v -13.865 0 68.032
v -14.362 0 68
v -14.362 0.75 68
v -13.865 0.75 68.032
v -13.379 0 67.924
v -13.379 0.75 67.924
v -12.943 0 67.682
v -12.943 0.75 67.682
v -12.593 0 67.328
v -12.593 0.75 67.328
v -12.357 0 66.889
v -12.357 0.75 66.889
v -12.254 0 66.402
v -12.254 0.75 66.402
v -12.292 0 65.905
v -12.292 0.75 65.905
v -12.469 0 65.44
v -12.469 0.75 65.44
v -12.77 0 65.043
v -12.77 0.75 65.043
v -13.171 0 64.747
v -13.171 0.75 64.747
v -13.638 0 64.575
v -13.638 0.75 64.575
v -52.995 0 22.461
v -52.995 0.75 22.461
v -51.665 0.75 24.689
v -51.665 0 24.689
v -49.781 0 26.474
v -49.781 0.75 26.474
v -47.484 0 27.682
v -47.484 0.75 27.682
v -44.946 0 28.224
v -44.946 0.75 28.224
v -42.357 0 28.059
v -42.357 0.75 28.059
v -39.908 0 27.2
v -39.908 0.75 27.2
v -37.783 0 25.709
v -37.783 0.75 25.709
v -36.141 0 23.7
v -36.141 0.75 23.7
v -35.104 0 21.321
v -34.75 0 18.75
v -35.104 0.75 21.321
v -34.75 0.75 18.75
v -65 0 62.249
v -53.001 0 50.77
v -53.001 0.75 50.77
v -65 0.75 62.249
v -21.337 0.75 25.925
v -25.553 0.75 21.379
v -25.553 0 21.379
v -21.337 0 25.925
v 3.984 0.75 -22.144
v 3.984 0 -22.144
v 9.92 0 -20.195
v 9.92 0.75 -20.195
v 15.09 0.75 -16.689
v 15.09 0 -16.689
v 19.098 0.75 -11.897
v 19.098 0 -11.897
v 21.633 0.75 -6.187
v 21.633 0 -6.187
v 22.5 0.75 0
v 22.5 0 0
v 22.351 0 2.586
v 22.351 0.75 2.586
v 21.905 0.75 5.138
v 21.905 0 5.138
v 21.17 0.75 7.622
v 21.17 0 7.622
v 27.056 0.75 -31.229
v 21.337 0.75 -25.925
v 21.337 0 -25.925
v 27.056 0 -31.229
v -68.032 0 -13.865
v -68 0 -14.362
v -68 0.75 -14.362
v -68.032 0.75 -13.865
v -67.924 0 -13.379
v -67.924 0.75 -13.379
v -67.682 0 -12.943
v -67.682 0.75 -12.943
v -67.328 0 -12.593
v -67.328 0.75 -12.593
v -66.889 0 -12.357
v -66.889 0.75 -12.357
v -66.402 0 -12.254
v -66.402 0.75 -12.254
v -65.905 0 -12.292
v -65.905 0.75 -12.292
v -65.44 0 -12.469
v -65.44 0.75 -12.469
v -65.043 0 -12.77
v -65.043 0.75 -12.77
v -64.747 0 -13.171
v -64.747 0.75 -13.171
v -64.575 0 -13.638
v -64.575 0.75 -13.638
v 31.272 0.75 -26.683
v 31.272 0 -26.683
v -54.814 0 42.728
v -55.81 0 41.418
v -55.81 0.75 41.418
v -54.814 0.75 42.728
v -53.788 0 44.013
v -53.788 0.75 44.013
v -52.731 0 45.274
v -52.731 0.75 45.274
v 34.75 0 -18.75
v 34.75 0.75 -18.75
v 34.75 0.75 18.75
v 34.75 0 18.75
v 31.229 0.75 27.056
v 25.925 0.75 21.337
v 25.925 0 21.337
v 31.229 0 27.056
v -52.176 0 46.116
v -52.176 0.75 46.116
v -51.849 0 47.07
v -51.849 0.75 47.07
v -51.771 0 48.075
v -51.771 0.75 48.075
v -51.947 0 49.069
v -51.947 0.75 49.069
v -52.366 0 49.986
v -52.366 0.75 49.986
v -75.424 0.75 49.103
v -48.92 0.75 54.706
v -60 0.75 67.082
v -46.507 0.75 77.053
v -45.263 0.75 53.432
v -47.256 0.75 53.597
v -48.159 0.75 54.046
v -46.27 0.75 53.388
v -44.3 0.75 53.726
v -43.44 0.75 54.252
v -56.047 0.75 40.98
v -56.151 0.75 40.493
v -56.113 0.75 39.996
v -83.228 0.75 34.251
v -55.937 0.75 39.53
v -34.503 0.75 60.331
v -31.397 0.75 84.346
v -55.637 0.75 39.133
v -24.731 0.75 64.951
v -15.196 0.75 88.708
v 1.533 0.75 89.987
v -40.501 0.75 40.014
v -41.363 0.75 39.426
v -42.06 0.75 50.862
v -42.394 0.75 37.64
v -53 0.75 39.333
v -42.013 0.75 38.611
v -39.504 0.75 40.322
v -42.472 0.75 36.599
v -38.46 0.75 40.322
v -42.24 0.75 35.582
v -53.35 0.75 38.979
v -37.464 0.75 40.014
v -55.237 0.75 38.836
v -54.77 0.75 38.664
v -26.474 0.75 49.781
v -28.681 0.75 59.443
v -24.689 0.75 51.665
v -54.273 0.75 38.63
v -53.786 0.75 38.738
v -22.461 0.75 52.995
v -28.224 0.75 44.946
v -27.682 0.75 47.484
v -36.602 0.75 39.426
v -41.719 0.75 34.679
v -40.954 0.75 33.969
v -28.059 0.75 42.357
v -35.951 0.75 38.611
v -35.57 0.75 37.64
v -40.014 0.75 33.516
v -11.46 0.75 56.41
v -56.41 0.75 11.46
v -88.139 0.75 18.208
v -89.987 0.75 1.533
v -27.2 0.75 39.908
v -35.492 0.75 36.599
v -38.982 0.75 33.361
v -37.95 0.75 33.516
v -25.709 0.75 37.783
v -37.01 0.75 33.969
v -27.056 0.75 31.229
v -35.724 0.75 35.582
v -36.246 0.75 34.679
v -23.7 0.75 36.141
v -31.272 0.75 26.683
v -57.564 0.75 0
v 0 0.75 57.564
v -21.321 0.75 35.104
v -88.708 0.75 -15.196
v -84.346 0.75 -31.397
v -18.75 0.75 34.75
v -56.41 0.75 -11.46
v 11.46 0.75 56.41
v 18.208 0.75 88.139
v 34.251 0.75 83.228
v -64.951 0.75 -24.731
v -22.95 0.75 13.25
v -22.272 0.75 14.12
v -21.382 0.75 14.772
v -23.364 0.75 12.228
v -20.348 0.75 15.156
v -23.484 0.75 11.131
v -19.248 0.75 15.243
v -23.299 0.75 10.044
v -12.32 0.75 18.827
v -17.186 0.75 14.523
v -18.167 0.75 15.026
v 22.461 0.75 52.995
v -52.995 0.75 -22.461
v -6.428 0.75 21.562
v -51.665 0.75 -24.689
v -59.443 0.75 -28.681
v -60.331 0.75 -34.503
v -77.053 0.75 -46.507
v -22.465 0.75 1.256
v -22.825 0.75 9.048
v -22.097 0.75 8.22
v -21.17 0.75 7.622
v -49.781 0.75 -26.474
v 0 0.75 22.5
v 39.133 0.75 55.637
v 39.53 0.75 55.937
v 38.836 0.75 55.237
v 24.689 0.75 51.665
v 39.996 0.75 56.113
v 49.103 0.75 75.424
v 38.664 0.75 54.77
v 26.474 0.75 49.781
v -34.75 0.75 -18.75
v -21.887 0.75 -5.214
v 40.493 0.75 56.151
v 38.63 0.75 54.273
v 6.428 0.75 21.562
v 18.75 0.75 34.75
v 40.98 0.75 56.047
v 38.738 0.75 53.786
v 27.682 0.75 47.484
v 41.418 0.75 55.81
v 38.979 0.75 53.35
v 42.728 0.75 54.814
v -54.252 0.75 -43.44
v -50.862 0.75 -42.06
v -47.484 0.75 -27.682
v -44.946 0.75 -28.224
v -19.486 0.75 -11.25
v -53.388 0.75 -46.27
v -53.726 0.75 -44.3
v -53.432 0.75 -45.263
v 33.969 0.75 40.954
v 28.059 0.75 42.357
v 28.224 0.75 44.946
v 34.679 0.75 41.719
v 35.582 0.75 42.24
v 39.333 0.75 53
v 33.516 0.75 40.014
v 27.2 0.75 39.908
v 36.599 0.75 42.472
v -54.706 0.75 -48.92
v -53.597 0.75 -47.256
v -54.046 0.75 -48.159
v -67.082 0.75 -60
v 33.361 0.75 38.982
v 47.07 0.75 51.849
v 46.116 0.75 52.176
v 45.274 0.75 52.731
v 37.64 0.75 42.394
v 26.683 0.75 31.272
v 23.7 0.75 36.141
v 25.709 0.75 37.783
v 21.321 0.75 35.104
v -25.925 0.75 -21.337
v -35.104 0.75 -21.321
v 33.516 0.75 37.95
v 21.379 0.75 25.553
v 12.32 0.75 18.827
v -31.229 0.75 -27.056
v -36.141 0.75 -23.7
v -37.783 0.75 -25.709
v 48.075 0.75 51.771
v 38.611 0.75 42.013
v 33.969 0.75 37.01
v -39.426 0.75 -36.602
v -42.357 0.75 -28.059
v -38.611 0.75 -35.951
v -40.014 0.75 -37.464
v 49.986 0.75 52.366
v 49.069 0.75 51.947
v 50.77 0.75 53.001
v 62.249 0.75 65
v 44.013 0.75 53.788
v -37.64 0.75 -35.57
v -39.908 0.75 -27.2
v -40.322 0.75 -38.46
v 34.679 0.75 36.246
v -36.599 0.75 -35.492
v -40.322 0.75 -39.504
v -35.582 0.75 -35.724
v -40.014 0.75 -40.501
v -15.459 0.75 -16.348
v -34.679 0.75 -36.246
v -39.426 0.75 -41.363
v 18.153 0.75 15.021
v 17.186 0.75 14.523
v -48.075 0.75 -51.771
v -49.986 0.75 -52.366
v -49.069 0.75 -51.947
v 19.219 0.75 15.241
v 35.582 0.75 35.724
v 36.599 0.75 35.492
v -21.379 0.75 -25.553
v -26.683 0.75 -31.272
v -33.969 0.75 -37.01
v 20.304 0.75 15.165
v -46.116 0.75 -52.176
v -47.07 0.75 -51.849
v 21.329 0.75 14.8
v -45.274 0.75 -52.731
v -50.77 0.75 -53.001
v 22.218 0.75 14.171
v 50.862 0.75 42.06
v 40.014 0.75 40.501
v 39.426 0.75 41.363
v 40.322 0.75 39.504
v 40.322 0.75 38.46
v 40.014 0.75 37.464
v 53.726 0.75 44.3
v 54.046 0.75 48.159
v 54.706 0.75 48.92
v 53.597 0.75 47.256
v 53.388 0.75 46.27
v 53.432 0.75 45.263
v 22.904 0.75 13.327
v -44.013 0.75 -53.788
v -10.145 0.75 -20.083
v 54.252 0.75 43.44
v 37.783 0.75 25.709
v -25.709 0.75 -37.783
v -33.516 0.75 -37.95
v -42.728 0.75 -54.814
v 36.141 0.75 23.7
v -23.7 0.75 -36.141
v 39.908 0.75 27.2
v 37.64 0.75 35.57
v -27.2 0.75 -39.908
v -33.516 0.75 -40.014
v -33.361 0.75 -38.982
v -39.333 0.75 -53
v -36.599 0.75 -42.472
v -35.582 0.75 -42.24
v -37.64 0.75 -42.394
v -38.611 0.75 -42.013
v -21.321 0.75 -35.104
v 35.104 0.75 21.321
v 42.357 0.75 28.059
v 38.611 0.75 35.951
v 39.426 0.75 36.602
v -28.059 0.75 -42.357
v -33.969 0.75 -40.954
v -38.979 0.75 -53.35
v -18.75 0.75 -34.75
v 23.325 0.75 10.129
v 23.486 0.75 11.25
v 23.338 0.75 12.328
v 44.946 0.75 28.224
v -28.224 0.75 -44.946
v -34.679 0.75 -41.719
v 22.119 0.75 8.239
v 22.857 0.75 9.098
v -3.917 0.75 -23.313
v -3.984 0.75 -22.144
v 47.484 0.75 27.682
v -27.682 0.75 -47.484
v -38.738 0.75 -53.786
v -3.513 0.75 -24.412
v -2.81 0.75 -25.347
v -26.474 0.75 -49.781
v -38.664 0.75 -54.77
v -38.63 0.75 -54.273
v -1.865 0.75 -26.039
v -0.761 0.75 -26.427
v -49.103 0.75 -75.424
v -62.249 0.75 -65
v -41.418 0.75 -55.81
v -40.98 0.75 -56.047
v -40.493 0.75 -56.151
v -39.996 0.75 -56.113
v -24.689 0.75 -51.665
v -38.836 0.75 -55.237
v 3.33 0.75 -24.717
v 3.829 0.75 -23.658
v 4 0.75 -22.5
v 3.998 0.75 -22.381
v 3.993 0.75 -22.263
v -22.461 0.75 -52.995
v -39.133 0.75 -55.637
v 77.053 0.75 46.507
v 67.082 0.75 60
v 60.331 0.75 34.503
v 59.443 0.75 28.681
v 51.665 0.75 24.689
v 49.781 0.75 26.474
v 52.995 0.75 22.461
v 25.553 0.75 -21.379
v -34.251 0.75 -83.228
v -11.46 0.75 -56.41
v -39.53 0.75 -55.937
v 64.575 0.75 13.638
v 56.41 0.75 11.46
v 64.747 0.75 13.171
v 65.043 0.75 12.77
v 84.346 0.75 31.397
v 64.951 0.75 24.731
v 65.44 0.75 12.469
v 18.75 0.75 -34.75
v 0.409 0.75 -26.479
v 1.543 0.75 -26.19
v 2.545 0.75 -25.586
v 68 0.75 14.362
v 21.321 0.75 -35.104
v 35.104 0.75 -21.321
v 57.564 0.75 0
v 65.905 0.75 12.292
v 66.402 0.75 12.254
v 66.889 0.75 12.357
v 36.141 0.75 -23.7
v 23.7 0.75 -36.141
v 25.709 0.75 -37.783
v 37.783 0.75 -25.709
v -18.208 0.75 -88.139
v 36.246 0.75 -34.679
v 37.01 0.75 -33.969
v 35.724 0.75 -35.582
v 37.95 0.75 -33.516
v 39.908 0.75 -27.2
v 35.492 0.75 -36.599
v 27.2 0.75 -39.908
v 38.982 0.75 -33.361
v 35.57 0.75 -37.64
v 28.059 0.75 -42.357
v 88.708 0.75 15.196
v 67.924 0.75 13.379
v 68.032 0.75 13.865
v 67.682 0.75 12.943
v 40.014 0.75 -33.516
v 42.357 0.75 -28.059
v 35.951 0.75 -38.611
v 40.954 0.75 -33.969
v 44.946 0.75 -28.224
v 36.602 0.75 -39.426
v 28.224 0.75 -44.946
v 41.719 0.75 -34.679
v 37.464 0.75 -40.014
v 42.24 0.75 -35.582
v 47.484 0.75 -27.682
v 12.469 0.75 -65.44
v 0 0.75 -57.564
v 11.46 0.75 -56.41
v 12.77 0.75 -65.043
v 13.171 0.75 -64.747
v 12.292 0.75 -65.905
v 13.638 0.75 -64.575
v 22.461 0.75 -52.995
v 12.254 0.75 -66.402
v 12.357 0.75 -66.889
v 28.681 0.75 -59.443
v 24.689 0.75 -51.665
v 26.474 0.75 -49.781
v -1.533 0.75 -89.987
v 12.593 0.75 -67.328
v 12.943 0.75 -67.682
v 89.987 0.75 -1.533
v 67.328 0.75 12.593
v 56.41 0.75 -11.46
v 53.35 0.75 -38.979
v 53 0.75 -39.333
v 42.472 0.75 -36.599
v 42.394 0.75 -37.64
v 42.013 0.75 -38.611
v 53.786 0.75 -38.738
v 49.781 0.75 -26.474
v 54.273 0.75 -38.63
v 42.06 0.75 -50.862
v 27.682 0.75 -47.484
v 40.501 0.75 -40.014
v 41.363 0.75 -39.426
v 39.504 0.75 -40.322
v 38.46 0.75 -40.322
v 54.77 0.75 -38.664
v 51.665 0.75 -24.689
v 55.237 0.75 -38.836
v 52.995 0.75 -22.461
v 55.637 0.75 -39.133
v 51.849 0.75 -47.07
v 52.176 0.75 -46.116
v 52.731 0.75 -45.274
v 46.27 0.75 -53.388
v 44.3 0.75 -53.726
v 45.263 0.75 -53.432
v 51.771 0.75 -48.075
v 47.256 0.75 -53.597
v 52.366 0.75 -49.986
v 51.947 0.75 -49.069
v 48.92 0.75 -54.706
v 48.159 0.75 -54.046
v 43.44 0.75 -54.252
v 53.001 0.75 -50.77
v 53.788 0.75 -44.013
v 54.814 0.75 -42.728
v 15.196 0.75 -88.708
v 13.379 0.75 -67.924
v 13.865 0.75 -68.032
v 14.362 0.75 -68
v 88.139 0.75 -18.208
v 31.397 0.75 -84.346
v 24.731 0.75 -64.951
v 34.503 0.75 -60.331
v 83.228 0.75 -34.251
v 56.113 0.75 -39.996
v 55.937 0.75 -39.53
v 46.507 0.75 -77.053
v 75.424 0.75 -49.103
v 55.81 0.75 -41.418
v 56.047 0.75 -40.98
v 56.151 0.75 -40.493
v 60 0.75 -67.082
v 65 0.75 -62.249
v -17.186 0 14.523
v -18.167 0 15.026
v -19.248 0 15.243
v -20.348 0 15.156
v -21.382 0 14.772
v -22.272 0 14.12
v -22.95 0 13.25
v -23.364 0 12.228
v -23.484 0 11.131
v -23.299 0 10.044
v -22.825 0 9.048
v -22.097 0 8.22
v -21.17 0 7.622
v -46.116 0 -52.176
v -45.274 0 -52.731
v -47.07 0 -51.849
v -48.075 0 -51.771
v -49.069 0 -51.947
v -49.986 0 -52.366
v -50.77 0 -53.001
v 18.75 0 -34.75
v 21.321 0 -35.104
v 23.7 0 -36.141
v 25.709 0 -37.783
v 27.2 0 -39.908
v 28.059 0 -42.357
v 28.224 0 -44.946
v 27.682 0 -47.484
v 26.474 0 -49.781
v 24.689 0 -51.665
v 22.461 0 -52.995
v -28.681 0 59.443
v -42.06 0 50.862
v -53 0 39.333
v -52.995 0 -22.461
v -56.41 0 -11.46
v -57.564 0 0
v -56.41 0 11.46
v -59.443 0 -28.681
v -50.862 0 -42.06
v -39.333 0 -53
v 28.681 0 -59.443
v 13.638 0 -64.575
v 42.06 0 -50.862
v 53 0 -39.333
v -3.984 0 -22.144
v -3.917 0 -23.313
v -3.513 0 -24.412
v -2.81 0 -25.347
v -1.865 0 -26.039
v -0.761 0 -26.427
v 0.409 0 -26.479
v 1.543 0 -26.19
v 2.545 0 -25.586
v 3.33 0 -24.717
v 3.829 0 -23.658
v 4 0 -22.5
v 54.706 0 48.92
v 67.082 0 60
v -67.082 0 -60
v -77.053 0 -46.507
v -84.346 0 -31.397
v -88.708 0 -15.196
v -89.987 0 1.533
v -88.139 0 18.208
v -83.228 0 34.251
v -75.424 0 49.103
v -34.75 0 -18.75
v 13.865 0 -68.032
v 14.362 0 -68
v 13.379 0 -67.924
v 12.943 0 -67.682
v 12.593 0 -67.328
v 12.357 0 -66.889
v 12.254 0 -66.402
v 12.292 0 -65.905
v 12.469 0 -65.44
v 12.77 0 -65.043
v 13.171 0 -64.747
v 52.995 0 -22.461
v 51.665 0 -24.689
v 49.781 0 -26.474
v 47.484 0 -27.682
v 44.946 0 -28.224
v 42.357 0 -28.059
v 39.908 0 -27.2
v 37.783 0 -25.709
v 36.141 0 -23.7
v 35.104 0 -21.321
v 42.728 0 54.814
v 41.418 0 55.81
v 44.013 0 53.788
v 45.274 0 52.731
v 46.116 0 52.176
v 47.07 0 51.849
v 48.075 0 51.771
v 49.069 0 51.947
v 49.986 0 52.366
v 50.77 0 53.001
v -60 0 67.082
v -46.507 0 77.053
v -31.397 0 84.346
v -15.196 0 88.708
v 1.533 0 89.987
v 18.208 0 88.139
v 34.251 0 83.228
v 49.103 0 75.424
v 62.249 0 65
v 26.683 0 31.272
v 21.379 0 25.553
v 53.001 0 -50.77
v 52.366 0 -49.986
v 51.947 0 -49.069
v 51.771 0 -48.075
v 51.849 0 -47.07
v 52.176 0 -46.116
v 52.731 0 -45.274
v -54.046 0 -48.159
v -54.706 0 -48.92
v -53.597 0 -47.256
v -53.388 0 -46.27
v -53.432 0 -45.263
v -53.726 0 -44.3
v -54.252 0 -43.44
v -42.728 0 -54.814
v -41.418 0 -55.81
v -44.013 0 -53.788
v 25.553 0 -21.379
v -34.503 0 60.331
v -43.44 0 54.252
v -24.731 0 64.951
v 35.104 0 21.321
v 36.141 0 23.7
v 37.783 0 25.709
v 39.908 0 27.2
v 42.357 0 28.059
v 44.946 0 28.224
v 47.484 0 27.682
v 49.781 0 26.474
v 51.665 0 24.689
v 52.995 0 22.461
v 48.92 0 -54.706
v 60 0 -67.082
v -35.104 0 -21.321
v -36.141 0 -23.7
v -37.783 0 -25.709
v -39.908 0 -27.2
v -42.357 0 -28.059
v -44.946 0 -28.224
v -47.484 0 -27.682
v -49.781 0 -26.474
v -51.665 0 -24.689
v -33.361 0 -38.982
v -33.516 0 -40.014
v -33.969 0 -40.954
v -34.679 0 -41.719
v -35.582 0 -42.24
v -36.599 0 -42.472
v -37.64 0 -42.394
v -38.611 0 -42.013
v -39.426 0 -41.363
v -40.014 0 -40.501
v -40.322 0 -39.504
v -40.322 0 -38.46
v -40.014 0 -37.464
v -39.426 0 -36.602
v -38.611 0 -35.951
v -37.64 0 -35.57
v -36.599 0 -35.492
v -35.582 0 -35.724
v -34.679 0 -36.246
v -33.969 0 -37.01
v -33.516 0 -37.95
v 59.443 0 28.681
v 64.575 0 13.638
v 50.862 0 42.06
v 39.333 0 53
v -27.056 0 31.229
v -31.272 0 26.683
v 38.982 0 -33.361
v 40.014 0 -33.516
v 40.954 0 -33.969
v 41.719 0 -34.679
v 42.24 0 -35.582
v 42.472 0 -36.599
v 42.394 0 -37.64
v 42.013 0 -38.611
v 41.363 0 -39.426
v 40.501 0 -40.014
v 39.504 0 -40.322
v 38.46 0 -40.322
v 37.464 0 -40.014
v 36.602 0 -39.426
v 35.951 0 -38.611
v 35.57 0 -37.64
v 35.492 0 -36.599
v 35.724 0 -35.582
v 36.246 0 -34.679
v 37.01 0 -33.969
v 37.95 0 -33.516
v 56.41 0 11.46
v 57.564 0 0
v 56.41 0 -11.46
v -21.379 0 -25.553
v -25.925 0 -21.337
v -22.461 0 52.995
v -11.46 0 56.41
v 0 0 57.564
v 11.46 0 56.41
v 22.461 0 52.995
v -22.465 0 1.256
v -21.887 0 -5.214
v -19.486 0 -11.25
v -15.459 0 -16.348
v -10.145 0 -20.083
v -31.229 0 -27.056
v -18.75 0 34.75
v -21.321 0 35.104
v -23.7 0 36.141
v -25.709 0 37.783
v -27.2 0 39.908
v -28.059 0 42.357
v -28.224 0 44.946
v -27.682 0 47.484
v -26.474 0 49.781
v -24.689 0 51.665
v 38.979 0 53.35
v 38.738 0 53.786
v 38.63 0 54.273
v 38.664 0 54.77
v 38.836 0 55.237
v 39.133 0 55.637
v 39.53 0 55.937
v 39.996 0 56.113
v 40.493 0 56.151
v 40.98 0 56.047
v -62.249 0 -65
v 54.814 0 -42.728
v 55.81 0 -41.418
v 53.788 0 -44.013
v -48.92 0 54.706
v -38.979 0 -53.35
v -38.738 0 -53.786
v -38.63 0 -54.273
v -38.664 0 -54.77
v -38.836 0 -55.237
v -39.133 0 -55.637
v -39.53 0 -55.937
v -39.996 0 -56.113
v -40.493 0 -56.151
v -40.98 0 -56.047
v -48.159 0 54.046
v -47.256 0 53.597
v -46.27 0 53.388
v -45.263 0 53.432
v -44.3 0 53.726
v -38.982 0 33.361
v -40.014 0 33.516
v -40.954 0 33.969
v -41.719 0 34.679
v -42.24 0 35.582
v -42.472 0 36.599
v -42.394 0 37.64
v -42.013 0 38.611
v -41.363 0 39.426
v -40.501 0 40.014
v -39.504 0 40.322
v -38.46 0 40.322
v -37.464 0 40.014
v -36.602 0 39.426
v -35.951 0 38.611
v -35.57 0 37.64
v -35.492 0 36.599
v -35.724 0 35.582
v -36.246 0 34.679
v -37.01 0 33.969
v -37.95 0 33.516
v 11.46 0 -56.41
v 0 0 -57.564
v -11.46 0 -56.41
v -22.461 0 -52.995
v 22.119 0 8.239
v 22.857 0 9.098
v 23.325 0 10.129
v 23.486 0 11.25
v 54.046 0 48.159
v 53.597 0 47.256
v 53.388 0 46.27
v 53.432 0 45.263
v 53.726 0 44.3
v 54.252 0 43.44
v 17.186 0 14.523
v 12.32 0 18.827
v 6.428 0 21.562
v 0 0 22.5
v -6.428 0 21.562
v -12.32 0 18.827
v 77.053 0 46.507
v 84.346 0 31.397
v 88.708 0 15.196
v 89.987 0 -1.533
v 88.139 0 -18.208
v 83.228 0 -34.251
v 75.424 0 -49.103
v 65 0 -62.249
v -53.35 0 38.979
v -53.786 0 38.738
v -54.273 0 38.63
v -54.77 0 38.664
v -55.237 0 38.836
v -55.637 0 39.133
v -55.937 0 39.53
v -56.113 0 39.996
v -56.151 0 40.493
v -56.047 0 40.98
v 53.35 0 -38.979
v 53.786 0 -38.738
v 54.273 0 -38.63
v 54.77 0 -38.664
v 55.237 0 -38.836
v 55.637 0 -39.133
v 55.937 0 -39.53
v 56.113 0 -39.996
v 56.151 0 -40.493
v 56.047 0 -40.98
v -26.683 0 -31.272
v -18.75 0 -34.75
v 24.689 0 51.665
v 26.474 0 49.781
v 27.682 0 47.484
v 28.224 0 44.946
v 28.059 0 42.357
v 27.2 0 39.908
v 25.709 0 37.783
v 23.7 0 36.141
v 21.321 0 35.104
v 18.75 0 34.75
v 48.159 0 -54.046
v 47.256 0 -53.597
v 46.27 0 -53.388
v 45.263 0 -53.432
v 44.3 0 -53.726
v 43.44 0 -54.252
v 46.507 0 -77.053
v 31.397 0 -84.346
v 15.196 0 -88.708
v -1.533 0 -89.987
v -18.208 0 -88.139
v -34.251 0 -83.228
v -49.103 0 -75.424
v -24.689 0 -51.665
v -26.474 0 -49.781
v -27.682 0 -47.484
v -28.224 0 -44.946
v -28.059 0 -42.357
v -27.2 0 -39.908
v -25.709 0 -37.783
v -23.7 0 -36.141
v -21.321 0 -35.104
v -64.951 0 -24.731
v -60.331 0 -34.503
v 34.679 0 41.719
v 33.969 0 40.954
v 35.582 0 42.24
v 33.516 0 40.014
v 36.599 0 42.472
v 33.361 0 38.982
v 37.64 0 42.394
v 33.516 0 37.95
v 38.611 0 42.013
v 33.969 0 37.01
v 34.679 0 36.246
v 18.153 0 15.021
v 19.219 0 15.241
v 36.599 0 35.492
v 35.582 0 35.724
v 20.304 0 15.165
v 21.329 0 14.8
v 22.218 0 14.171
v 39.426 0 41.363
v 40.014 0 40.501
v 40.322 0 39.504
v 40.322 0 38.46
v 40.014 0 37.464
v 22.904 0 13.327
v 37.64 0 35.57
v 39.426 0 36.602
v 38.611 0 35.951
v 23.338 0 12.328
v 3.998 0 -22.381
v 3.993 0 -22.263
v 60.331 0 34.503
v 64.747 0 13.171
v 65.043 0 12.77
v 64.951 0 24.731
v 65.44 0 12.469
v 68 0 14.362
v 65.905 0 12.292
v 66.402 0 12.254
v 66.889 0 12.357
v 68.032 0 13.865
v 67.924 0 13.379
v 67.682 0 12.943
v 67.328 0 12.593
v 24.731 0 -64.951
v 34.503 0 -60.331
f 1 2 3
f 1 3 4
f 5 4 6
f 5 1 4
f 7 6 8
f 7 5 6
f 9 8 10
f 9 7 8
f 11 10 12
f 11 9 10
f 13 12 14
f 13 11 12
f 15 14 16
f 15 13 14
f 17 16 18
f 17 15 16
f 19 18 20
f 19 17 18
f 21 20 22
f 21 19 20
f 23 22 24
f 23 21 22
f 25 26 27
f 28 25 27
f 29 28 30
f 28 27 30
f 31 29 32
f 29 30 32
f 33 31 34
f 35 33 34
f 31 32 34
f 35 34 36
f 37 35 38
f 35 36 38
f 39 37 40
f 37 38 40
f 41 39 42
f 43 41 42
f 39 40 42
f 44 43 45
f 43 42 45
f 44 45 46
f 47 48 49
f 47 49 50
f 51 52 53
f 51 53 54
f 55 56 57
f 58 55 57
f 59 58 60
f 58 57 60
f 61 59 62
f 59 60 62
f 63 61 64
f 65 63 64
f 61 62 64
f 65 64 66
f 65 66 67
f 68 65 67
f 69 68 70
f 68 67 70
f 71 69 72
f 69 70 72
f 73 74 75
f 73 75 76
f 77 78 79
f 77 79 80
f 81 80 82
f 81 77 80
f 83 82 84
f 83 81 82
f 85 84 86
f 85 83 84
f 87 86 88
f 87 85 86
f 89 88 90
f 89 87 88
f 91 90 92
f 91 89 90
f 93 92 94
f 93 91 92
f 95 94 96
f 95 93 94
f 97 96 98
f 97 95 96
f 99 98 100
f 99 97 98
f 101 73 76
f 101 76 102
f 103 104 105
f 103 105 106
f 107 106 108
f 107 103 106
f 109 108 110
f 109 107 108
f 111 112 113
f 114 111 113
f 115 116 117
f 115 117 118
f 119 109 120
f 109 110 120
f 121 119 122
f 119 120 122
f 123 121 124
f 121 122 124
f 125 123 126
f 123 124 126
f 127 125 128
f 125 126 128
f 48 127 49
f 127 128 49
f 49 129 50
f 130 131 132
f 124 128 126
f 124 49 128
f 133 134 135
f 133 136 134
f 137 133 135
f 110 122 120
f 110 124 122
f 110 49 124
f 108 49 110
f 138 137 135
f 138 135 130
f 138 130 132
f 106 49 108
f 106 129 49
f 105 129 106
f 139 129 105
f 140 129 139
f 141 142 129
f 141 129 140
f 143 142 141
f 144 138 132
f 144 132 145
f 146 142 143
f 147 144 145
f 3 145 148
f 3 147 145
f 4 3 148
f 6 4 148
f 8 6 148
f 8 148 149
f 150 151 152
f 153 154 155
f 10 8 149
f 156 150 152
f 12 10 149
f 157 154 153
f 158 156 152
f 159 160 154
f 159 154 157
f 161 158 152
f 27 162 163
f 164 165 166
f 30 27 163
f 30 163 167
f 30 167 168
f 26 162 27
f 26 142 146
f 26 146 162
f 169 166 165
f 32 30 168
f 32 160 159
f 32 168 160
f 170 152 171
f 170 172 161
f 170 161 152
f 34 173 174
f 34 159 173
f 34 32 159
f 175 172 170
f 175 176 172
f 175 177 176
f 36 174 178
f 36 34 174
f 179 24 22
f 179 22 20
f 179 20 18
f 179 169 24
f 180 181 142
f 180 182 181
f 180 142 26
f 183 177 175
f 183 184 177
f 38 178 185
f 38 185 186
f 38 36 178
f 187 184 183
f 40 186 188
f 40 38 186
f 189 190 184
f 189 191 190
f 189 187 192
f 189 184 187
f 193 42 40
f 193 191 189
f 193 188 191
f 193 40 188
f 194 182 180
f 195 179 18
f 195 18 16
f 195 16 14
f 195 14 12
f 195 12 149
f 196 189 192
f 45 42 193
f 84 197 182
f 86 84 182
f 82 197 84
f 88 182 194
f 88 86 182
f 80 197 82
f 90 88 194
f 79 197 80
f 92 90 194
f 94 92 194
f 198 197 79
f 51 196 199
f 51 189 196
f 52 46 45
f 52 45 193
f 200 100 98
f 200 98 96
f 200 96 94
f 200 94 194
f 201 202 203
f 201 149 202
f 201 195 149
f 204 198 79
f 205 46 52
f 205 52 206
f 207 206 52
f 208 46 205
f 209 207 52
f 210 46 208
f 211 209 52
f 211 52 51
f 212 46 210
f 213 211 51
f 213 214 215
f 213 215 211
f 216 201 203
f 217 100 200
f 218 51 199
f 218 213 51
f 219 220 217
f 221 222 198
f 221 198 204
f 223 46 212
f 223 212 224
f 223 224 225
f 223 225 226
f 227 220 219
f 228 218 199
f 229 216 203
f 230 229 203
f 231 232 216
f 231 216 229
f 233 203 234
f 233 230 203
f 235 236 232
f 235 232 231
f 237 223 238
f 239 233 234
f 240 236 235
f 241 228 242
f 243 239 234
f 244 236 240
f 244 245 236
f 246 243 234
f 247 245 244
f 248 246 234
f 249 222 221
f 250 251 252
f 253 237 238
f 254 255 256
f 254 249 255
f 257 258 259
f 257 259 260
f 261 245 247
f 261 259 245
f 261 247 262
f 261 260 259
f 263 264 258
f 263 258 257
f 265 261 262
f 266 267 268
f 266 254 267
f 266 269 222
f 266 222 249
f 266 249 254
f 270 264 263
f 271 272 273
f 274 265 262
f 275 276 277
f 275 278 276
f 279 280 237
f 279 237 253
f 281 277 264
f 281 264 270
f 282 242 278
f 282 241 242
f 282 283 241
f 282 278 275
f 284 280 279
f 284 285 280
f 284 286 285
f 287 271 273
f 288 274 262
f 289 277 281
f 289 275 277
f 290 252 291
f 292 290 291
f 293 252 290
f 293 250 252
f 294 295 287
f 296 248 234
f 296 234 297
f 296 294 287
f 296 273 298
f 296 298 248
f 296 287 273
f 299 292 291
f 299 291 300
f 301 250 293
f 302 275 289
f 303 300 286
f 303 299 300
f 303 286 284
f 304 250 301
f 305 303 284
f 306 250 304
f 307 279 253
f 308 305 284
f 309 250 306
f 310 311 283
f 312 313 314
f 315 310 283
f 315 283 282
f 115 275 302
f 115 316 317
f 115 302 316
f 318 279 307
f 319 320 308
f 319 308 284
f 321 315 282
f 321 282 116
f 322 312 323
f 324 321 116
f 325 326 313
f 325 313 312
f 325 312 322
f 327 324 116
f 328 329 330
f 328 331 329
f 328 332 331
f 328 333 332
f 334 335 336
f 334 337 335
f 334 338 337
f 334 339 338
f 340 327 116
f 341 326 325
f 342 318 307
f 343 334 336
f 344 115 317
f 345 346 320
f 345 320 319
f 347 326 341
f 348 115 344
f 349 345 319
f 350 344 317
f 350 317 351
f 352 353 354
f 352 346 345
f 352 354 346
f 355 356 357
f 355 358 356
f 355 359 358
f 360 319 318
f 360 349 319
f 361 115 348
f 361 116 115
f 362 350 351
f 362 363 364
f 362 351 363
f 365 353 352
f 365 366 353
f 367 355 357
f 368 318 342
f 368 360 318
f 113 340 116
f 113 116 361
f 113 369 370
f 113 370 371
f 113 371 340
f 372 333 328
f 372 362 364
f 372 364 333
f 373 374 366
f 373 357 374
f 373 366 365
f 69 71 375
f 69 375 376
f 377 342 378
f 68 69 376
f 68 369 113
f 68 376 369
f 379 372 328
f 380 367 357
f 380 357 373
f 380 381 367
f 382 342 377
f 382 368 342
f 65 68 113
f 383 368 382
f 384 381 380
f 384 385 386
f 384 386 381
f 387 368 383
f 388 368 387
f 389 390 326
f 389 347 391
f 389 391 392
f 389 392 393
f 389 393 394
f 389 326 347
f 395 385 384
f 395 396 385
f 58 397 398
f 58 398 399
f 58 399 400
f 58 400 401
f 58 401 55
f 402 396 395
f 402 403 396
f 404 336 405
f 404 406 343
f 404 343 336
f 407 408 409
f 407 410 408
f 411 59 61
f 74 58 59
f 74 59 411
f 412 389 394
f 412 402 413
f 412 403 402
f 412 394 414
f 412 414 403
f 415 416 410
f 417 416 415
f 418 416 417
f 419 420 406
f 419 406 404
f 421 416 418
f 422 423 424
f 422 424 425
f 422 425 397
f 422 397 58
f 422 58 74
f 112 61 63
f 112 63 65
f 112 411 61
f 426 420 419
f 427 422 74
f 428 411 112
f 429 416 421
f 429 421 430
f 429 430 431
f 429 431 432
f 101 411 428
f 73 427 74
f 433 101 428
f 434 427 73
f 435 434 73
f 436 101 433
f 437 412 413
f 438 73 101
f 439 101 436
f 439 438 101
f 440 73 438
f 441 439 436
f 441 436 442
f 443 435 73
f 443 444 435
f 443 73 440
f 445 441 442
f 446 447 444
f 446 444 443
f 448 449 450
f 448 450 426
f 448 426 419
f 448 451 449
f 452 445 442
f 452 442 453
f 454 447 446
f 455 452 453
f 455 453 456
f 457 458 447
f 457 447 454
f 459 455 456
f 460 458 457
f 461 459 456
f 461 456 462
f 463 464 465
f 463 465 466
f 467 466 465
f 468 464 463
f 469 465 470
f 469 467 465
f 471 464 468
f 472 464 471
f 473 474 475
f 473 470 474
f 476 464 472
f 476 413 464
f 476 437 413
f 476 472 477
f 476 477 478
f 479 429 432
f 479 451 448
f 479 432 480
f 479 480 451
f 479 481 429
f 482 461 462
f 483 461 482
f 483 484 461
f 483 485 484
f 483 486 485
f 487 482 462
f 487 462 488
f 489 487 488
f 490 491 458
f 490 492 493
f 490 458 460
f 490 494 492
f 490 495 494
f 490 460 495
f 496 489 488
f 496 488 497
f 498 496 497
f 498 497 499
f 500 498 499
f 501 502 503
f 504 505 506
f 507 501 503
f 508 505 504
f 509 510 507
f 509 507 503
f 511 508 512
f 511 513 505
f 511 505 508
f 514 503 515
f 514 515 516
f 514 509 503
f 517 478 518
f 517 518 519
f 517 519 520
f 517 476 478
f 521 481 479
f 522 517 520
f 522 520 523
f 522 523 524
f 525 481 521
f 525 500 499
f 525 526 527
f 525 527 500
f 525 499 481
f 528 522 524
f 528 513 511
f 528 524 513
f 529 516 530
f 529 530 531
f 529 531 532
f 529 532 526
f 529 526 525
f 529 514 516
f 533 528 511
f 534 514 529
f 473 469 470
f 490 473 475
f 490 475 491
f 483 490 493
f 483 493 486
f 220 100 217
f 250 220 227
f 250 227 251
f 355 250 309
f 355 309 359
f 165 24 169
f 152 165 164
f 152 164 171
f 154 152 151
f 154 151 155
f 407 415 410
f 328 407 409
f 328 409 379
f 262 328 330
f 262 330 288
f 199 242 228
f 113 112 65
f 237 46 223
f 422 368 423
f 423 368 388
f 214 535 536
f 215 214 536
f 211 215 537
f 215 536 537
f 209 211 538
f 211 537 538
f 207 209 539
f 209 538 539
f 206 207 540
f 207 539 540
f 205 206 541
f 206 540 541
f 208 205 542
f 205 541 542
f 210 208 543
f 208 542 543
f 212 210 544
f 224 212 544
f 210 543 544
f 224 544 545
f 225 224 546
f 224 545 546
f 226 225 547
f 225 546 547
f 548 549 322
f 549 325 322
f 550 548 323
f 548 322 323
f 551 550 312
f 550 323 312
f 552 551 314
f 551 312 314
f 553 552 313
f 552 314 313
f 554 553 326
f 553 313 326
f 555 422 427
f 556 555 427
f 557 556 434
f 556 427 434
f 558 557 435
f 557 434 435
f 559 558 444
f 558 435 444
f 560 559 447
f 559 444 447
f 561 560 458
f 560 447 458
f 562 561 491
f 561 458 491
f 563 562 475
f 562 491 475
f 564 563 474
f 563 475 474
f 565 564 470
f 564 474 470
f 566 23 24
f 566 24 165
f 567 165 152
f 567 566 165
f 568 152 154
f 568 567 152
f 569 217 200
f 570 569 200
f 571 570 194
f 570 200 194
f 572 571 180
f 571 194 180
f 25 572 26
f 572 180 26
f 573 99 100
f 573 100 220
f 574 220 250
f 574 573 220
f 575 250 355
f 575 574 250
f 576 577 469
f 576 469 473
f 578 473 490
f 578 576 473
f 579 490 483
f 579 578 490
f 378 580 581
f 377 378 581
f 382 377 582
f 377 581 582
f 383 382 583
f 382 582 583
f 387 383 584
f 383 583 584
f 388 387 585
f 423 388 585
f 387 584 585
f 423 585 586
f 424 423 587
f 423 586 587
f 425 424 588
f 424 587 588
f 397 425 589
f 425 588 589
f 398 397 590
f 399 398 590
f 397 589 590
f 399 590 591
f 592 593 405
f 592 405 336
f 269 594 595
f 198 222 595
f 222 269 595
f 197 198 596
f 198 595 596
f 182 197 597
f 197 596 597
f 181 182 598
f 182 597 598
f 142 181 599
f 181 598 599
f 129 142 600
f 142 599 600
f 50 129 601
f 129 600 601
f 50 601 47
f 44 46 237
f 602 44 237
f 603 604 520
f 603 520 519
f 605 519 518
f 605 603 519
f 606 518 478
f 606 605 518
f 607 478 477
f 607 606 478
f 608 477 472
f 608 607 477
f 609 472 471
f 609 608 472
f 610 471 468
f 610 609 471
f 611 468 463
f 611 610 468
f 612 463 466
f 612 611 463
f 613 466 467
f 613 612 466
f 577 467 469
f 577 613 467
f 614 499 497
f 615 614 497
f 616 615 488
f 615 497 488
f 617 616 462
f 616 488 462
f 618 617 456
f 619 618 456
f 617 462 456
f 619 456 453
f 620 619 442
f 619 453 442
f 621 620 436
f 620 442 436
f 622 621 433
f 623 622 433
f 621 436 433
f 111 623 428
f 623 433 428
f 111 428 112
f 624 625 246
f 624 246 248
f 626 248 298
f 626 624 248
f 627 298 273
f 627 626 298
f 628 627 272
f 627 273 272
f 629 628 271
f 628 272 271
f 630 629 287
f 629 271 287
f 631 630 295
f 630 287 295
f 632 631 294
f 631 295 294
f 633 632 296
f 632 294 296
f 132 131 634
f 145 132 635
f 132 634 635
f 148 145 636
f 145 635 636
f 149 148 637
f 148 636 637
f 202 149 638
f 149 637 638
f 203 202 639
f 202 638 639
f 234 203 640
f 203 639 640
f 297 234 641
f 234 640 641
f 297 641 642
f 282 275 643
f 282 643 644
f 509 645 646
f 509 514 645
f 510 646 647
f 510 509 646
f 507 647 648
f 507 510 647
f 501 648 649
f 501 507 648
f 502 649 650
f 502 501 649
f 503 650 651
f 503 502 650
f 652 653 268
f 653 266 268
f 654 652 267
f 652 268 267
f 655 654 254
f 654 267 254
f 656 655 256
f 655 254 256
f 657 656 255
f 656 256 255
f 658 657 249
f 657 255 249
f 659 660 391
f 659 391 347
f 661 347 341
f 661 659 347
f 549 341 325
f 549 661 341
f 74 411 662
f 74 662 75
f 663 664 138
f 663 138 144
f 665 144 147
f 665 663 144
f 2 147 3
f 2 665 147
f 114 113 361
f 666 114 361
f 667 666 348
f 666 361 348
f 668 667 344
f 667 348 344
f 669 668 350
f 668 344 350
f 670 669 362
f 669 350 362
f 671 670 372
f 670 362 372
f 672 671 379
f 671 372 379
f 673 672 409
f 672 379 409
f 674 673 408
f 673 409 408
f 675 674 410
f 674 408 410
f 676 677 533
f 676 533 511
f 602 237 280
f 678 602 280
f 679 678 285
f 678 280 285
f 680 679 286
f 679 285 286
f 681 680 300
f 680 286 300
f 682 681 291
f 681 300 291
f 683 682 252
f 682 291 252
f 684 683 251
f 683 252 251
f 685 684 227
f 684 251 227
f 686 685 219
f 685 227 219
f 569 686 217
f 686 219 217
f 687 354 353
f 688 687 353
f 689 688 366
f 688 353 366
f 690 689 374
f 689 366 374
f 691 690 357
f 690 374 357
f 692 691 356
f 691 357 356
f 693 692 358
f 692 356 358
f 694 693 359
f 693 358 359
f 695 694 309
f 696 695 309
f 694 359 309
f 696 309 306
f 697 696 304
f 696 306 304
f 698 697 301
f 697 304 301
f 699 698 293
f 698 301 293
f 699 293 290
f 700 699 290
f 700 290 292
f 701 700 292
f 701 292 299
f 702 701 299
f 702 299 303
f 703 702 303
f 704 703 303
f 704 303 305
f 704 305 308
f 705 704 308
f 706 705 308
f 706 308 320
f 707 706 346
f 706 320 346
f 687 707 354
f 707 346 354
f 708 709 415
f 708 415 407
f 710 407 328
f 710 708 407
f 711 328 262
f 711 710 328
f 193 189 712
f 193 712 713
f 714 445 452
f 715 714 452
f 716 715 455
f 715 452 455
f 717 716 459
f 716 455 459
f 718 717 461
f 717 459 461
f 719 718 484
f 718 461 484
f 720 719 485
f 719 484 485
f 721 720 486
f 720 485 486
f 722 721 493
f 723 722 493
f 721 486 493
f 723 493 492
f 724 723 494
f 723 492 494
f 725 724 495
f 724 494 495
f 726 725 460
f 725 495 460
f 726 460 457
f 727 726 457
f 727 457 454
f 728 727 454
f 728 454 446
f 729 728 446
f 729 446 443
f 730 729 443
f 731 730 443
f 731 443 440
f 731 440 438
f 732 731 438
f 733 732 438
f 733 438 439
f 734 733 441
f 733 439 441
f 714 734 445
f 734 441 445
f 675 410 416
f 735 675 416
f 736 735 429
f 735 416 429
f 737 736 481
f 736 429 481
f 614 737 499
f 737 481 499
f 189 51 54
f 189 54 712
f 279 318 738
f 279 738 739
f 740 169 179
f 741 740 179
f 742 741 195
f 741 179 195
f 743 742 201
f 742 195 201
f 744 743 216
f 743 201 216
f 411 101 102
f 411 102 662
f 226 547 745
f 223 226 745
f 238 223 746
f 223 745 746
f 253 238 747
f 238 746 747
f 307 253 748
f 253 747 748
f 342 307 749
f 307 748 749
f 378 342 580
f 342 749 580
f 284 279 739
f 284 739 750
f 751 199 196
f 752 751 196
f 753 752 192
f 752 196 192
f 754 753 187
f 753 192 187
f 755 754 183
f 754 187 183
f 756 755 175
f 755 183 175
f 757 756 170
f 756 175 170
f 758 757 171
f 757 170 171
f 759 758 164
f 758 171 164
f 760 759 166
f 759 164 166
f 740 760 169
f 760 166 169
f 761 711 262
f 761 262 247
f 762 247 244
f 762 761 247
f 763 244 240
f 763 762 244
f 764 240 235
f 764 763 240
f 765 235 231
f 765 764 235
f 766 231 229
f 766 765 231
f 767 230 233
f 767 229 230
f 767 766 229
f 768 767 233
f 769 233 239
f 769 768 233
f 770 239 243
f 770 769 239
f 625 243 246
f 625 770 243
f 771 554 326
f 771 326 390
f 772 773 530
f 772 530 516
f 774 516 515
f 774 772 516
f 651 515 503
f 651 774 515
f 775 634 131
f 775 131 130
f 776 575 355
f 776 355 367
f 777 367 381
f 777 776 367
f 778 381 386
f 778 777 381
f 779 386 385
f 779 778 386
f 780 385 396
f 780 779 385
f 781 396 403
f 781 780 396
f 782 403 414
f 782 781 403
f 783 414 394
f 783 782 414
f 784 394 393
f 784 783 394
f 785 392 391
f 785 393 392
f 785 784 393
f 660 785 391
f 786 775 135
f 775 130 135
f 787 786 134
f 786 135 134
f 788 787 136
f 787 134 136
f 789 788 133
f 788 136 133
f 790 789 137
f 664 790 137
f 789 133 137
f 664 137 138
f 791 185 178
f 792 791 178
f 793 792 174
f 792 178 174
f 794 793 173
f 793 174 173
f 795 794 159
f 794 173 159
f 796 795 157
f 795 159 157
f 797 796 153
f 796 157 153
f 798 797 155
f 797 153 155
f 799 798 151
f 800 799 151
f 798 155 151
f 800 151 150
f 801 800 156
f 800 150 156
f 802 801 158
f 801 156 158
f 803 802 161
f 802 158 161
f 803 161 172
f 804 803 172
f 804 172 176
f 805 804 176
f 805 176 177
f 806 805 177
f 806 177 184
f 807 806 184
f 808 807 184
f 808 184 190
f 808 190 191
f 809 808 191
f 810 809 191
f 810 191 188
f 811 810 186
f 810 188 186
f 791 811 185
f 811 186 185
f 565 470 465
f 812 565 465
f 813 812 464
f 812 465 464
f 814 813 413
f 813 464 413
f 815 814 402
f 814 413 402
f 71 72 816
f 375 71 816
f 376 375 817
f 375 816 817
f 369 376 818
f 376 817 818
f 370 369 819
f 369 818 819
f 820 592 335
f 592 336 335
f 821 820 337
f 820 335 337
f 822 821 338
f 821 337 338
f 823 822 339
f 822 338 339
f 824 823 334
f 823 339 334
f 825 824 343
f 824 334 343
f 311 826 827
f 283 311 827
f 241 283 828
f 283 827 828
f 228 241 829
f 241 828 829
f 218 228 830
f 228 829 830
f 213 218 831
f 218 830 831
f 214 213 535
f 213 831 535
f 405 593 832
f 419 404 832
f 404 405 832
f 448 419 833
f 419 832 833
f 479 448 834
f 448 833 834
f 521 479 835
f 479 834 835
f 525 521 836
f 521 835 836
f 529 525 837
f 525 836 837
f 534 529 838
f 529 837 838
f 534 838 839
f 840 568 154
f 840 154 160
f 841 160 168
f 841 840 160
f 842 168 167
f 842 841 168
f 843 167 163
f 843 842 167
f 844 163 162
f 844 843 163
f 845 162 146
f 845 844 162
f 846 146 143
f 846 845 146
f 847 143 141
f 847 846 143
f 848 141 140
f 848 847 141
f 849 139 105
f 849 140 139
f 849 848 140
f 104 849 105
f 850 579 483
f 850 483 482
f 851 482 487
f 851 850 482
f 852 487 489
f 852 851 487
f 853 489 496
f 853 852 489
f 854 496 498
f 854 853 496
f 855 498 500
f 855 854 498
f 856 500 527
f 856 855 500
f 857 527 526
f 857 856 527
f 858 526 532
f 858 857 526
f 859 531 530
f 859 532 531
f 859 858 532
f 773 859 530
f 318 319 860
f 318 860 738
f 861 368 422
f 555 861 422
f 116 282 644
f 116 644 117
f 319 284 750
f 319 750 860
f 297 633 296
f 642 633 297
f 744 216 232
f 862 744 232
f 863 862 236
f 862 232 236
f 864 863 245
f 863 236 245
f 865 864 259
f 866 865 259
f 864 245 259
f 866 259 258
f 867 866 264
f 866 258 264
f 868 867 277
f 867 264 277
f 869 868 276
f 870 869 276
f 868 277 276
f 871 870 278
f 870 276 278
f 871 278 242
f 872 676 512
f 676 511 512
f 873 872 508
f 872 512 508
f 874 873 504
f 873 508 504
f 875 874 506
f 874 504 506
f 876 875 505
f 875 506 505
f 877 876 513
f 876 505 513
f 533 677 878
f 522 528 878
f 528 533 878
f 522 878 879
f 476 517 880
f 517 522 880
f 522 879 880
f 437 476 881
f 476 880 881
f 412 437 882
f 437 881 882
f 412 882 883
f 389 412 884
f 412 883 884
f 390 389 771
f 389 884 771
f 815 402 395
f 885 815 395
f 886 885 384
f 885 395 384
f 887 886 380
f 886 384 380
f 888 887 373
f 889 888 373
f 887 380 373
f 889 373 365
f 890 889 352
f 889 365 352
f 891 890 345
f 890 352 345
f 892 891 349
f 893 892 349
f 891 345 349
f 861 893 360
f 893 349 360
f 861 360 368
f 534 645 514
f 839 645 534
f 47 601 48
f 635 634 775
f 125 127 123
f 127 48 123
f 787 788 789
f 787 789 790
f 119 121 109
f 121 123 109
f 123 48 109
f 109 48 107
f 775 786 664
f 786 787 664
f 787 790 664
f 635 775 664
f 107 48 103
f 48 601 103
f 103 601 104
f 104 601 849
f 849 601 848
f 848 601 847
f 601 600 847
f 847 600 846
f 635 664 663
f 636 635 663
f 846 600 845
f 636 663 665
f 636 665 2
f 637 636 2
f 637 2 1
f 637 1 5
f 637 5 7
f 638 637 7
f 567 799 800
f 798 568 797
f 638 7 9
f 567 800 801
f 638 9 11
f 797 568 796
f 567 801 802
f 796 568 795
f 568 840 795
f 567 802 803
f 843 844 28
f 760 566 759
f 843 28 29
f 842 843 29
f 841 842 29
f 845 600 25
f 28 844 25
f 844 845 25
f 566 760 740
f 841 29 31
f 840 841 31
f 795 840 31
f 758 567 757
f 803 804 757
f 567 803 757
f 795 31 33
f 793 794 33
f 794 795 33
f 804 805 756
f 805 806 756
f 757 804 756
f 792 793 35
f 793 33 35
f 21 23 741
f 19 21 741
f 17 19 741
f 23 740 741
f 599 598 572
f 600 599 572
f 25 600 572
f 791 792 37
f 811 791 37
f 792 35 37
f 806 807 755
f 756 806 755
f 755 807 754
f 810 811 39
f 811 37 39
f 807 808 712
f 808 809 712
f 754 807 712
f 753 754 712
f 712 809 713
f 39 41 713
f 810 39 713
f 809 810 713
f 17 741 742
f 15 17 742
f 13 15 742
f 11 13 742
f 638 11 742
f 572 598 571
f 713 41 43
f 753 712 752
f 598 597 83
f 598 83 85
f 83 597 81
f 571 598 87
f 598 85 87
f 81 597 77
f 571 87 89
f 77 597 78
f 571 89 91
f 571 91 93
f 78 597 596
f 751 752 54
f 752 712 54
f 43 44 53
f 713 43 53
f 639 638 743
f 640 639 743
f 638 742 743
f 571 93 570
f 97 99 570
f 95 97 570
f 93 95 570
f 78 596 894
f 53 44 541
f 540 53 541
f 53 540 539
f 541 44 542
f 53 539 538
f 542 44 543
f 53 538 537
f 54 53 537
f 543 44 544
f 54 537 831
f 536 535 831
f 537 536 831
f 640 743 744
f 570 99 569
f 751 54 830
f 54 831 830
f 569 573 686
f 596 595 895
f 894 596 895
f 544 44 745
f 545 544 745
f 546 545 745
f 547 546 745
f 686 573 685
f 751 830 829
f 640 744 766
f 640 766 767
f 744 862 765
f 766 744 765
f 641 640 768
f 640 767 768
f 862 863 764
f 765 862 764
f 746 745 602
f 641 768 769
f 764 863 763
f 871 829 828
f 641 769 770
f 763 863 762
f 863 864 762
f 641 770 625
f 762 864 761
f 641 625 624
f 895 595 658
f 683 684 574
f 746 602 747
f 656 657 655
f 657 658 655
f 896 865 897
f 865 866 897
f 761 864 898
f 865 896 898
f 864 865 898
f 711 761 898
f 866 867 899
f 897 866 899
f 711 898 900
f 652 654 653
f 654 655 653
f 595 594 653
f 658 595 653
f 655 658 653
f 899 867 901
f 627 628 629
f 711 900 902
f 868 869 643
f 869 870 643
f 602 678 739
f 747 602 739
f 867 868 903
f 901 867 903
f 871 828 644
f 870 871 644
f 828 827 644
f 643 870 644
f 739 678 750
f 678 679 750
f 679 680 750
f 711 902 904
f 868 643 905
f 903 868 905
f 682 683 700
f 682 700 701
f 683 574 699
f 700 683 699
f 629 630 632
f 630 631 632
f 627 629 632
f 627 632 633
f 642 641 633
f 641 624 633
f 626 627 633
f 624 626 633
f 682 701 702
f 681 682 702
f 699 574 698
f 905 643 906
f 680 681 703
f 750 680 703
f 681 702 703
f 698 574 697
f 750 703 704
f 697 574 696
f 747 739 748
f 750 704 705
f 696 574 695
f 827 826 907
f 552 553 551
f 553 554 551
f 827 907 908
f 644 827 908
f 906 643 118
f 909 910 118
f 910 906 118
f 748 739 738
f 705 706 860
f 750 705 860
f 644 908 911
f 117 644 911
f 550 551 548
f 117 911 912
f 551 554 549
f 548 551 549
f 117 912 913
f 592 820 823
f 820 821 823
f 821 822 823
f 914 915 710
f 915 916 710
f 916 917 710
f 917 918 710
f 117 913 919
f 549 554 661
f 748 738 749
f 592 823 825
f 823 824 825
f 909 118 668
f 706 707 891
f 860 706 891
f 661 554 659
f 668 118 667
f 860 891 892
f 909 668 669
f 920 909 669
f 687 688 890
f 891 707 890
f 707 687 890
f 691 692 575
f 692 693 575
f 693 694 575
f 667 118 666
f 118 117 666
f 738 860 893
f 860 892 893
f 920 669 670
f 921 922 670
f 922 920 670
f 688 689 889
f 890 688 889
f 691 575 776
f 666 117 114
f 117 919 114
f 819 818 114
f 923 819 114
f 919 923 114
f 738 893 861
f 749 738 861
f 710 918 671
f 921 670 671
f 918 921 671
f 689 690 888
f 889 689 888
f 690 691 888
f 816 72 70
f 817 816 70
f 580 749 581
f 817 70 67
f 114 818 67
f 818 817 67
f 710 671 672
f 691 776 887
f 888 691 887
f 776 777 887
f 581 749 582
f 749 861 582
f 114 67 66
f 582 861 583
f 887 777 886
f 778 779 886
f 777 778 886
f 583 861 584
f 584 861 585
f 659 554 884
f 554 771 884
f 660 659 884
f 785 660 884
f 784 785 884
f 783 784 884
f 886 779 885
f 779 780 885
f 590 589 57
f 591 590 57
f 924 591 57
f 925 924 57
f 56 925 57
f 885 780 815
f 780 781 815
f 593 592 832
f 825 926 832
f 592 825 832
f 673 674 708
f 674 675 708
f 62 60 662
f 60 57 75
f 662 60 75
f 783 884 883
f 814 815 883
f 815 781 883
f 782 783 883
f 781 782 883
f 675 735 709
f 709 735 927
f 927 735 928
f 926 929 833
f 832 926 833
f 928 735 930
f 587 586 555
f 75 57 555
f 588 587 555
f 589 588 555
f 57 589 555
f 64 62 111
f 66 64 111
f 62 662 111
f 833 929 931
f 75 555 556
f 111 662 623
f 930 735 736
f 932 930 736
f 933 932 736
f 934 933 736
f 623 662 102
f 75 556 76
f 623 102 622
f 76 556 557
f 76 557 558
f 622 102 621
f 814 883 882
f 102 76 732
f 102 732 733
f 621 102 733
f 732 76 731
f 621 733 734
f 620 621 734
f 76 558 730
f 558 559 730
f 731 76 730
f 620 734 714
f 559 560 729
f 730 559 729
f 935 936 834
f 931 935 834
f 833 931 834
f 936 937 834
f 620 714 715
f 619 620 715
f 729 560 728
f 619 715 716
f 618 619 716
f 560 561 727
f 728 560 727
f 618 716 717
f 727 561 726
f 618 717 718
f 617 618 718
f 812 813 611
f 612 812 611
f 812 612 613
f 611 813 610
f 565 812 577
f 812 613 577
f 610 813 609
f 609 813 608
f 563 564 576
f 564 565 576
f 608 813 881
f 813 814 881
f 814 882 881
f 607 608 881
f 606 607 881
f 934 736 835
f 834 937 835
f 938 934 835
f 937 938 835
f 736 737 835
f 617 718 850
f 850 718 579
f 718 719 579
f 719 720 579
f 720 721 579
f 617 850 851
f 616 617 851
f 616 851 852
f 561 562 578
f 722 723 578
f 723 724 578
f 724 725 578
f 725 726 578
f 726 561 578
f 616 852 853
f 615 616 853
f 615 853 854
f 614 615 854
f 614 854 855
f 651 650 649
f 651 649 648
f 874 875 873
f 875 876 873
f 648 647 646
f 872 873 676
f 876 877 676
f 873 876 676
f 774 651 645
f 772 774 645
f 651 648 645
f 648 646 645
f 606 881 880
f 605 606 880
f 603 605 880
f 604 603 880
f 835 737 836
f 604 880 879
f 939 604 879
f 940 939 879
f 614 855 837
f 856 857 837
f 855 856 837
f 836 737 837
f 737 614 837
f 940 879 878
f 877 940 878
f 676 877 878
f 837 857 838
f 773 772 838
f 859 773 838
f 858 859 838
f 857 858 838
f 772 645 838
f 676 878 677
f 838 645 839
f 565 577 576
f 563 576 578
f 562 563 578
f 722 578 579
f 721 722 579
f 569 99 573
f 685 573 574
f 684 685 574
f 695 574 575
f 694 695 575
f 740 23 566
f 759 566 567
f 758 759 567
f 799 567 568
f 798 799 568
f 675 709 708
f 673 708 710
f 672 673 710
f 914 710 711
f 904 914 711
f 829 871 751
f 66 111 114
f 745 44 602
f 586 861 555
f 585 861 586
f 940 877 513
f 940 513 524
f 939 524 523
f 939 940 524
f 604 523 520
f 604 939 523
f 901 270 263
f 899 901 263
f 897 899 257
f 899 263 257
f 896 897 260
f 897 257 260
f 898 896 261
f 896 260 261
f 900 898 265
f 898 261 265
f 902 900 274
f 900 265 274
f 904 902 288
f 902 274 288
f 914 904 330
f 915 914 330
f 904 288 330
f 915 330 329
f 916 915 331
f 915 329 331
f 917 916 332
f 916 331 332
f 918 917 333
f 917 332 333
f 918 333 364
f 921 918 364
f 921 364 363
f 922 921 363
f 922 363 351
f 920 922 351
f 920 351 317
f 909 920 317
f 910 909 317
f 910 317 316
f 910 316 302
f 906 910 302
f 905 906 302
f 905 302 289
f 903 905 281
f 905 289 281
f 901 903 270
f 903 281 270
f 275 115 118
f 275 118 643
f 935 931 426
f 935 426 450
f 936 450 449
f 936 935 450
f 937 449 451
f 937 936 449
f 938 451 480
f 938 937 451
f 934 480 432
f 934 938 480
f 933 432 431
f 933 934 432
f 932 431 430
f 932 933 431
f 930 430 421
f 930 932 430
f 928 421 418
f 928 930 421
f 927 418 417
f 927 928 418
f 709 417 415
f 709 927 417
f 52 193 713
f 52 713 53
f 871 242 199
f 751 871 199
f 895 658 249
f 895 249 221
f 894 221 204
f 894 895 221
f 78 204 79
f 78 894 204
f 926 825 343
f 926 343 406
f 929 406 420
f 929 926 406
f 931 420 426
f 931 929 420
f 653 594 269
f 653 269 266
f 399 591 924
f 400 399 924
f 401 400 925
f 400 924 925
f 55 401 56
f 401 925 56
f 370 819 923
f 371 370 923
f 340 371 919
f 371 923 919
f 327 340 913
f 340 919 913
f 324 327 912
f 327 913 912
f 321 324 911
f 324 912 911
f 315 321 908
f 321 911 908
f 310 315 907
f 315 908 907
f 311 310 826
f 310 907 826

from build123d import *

# Parameters (mm, degrees)
SKETCH2_R                = 90
BOSS_EXTRUDE1_DEPTH      = 0.75
CUT_EXTRUDE2_DEPTH       = 0.75
CUT_EXTRUDE6_START       = -1.75
CUT_EXTRUDE6_DEPTH       = 2.5
CUT_EXTRUDE7_DEPTH       = 0.75
FILLET1_R                = 4
CIRPATTERN1_COUNT        = 4
CIRPATTERN2_COUNT        = 4
FILLET1_OF_CIRPATTERN2_R = 4
SKETCH9_R                = 3.5
CUT_EXTRUDE8_DEPTH       = 0.75
CIRPATTERN3_COUNT        = 4


with BuildPart() as part:
    # Sketch2 → Boss-Extrude1 (new body)
    with BuildSketch(Plane(origin=(0, 0, 0), x_dir=(1, 0, 0), z_dir=(0, 1, 0))):
        Circle(SKETCH2_R)
        with BuildLine():
            ThreePointArc((21.169734538, -7.621833087), (22.857266397, -9.097867547), (23.485571585, -11.25))
            ThreePointArc((23.485571585, -11.25), (21.32947872, -14.799648783), (17.185568345, -14.522611358))
            ThreePointArc((17.185568345, -14.522611358), (0, -22.5), (-17.185568345, -14.522611358))
            ThreePointArc((-17.185568345, -14.522611358), (-22.9496732, -13.25), (-21.169734538, -7.621833087))
            ThreePointArc((-21.169734538, -7.621833087), (-19.485571585, 11.25), (-3.984166192, 22.144444444))
            ThreePointArc((-3.984166192, 22.144444444), (-0.177953971, 26.496039587), (4, 22.5))
            ThreePointArc((4, 22.5), (3.996039587, 22.322046029), (3.984166192, 22.144444444))
            ThreePointArc((3.984166192, 22.144444444), (17.261137554, 14.432710429), (22.5, 0))
            ThreePointArc((22.5, 0), (22.164938835, -3.8685251), (21.169734538, -7.621833087))
        make_face(mode=Mode.SUBTRACT)
    extrude(amount=BOSS_EXTRUDE1_DEPTH)

    # Sketch4 → Cut-Extrude2 (cut)
    with BuildSketch(Plane(origin=(0, 0.75, 0), x_dir=(1, 0, 0), z_dir=(0, 1, 0))):
        with BuildLine():
            Line((-18.75, 34.75), (18.75, 34.75))
            ThreePointArc((18.75, 34.75), (28.059393859, 42.356541264), (22.4609375, 52.995224003))
            ThreePointArc((22.4609375, 52.995224003), (0, 57.563605035), (-22.4609375, 52.995224003))
            ThreePointArc((-22.4609375, 52.995224003), (-28.059393859, 42.356541264), (-18.75, 34.75))
        make_face()
    cut_extrude2 = extrude(amount=-CUT_EXTRUDE2_DEPTH, mode=Mode.SUBTRACT)

    # Sketch7 → Cut-Extrude6 (cut)
    with BuildSketch(Plane(origin=(0, 0.75, 0), x_dir=(1, 0, 0), z_dir=(0, 1, 0)).offset(CUT_EXTRUDE6_START)):
        with BuildLine():
            Line((50.187203194, 48.078005736), (65, 62.24949799))
            ThreePointArc((65, 62.24949799), (62.546689472, 64.714076027), (60, 67.082039325))
            Line((60, 67.082039325), (46.326130039, 51.8086834))
            ThreePointArc((46.326130039, 51.8086834), (31.405257095, 61.999676022), (14.361623616, 67.99995417))
            ThreePointArc((14.361623616, 67.99995417), (12.287770938, 66.649348724), (13.638376384, 64.575496046))
            ThreePointArc((13.638376384, 64.575496046), (35.62942383, 55.556675185), (52.99956323, 39.332509421))
            ThreePointArc((52.99956323, 39.332509421), (55.447762126, 38.970125419), (55.810146129, 41.418324315))
            ThreePointArc((55.810146129, 41.418324315), (53.103176506, 44.836398662), (50.187203194, 48.078005736))
        make_face()
    cut_extrude6 = extrude(amount=CUT_EXTRUDE6_DEPTH, mode=Mode.SUBTRACT)

    # Sketch8 → Cut-Extrude7 (cut)
    with BuildSketch(Plane(origin=(0, 0.75, 0), x_dir=(1, 0, 0), z_dir=(0, 1, 0))):
        Polygon((-25.925493975, 21.336832502), (-31.229304965, 27.056062257), (-26.683250545, 31.271912018), (-21.379439555, 25.552682263), align=None)
    cut_extrude7 = extrude(amount=-CUT_EXTRUDE7_DEPTH, mode=Mode.SUBTRACT)

    # Fillet1
    fillet1_edges = [part.edges().sort_by_distance(p)[0] for p in [
        (50.187203194, 0.375, -48.078005736),
        (46.326130039, 0.375, -51.8086834),
    ]]
    fillet(fillet1_edges, radius=FILLET1_R)

    # CirPattern1: Cut-Extrude2, Cut-Extrude7 ×4 about axis
    cirpattern1_axis = Axis((0, 0, 0), (0, 1, 0))
    for i in range(1, CIRPATTERN1_COUNT):
        add(cut_extrude2.rotate(cirpattern1_axis, i * 360 / CIRPATTERN1_COUNT), mode=Mode.SUBTRACT)
        add(cut_extrude7.rotate(cirpattern1_axis, i * 360 / CIRPATTERN1_COUNT), mode=Mode.SUBTRACT)

    # CirPattern2: Cut-Extrude6 ×4 about axis
    cirpattern2_axis = Axis((0, 0, 0), (0, 1, 0))
    for i in range(1, CIRPATTERN2_COUNT):
        add(cut_extrude6.rotate(cirpattern2_axis, i * 360 / CIRPATTERN2_COUNT), mode=Mode.SUBTRACT)

    # Fillet1 of CirPattern2
    fillet1_of_cirpattern2_edges = [part.edges().sort_by_distance(p)[0] for p in [
        (-48.078005736, 0.375, -50.187203194),
        (-51.8086834, 0.375, -46.326130039),
        (-50.187203194, 0.375, 48.078005736),
        (-46.326130039, 0.375, 51.8086834),
        (48.078005736, 0.375, 50.187203194),
        (51.8086834, 0.375, 46.326130039),
    ]]
    fillet(fillet1_of_cirpattern2_edges, radius=FILLET1_OF_CIRPATTERN2_R)

    # Sketch9 → Cut-Extrude8 (cut)
    with BuildSketch(Plane(origin=(0, 0.75, 0), x_dir=(1, 0, 0), z_dir=(0, 1, 0))):
        with Locations((-36.860788245, 38.982108588)):
            Circle(SKETCH9_R)
    cut_extrude8 = extrude(amount=-CUT_EXTRUDE8_DEPTH, mode=Mode.SUBTRACT)

    # CirPattern3: Cut-Extrude8 ×4 about axis
    cirpattern3_axis = Axis((0, 0, 0), (0, 1, 0))
    for i in range(1, CIRPATTERN3_COUNT):
        add(cut_extrude8.rotate(cirpattern3_axis, i * 360 / CIRPATTERN3_COUNT), mode=Mode.SUBTRACT)


solid = part.part
